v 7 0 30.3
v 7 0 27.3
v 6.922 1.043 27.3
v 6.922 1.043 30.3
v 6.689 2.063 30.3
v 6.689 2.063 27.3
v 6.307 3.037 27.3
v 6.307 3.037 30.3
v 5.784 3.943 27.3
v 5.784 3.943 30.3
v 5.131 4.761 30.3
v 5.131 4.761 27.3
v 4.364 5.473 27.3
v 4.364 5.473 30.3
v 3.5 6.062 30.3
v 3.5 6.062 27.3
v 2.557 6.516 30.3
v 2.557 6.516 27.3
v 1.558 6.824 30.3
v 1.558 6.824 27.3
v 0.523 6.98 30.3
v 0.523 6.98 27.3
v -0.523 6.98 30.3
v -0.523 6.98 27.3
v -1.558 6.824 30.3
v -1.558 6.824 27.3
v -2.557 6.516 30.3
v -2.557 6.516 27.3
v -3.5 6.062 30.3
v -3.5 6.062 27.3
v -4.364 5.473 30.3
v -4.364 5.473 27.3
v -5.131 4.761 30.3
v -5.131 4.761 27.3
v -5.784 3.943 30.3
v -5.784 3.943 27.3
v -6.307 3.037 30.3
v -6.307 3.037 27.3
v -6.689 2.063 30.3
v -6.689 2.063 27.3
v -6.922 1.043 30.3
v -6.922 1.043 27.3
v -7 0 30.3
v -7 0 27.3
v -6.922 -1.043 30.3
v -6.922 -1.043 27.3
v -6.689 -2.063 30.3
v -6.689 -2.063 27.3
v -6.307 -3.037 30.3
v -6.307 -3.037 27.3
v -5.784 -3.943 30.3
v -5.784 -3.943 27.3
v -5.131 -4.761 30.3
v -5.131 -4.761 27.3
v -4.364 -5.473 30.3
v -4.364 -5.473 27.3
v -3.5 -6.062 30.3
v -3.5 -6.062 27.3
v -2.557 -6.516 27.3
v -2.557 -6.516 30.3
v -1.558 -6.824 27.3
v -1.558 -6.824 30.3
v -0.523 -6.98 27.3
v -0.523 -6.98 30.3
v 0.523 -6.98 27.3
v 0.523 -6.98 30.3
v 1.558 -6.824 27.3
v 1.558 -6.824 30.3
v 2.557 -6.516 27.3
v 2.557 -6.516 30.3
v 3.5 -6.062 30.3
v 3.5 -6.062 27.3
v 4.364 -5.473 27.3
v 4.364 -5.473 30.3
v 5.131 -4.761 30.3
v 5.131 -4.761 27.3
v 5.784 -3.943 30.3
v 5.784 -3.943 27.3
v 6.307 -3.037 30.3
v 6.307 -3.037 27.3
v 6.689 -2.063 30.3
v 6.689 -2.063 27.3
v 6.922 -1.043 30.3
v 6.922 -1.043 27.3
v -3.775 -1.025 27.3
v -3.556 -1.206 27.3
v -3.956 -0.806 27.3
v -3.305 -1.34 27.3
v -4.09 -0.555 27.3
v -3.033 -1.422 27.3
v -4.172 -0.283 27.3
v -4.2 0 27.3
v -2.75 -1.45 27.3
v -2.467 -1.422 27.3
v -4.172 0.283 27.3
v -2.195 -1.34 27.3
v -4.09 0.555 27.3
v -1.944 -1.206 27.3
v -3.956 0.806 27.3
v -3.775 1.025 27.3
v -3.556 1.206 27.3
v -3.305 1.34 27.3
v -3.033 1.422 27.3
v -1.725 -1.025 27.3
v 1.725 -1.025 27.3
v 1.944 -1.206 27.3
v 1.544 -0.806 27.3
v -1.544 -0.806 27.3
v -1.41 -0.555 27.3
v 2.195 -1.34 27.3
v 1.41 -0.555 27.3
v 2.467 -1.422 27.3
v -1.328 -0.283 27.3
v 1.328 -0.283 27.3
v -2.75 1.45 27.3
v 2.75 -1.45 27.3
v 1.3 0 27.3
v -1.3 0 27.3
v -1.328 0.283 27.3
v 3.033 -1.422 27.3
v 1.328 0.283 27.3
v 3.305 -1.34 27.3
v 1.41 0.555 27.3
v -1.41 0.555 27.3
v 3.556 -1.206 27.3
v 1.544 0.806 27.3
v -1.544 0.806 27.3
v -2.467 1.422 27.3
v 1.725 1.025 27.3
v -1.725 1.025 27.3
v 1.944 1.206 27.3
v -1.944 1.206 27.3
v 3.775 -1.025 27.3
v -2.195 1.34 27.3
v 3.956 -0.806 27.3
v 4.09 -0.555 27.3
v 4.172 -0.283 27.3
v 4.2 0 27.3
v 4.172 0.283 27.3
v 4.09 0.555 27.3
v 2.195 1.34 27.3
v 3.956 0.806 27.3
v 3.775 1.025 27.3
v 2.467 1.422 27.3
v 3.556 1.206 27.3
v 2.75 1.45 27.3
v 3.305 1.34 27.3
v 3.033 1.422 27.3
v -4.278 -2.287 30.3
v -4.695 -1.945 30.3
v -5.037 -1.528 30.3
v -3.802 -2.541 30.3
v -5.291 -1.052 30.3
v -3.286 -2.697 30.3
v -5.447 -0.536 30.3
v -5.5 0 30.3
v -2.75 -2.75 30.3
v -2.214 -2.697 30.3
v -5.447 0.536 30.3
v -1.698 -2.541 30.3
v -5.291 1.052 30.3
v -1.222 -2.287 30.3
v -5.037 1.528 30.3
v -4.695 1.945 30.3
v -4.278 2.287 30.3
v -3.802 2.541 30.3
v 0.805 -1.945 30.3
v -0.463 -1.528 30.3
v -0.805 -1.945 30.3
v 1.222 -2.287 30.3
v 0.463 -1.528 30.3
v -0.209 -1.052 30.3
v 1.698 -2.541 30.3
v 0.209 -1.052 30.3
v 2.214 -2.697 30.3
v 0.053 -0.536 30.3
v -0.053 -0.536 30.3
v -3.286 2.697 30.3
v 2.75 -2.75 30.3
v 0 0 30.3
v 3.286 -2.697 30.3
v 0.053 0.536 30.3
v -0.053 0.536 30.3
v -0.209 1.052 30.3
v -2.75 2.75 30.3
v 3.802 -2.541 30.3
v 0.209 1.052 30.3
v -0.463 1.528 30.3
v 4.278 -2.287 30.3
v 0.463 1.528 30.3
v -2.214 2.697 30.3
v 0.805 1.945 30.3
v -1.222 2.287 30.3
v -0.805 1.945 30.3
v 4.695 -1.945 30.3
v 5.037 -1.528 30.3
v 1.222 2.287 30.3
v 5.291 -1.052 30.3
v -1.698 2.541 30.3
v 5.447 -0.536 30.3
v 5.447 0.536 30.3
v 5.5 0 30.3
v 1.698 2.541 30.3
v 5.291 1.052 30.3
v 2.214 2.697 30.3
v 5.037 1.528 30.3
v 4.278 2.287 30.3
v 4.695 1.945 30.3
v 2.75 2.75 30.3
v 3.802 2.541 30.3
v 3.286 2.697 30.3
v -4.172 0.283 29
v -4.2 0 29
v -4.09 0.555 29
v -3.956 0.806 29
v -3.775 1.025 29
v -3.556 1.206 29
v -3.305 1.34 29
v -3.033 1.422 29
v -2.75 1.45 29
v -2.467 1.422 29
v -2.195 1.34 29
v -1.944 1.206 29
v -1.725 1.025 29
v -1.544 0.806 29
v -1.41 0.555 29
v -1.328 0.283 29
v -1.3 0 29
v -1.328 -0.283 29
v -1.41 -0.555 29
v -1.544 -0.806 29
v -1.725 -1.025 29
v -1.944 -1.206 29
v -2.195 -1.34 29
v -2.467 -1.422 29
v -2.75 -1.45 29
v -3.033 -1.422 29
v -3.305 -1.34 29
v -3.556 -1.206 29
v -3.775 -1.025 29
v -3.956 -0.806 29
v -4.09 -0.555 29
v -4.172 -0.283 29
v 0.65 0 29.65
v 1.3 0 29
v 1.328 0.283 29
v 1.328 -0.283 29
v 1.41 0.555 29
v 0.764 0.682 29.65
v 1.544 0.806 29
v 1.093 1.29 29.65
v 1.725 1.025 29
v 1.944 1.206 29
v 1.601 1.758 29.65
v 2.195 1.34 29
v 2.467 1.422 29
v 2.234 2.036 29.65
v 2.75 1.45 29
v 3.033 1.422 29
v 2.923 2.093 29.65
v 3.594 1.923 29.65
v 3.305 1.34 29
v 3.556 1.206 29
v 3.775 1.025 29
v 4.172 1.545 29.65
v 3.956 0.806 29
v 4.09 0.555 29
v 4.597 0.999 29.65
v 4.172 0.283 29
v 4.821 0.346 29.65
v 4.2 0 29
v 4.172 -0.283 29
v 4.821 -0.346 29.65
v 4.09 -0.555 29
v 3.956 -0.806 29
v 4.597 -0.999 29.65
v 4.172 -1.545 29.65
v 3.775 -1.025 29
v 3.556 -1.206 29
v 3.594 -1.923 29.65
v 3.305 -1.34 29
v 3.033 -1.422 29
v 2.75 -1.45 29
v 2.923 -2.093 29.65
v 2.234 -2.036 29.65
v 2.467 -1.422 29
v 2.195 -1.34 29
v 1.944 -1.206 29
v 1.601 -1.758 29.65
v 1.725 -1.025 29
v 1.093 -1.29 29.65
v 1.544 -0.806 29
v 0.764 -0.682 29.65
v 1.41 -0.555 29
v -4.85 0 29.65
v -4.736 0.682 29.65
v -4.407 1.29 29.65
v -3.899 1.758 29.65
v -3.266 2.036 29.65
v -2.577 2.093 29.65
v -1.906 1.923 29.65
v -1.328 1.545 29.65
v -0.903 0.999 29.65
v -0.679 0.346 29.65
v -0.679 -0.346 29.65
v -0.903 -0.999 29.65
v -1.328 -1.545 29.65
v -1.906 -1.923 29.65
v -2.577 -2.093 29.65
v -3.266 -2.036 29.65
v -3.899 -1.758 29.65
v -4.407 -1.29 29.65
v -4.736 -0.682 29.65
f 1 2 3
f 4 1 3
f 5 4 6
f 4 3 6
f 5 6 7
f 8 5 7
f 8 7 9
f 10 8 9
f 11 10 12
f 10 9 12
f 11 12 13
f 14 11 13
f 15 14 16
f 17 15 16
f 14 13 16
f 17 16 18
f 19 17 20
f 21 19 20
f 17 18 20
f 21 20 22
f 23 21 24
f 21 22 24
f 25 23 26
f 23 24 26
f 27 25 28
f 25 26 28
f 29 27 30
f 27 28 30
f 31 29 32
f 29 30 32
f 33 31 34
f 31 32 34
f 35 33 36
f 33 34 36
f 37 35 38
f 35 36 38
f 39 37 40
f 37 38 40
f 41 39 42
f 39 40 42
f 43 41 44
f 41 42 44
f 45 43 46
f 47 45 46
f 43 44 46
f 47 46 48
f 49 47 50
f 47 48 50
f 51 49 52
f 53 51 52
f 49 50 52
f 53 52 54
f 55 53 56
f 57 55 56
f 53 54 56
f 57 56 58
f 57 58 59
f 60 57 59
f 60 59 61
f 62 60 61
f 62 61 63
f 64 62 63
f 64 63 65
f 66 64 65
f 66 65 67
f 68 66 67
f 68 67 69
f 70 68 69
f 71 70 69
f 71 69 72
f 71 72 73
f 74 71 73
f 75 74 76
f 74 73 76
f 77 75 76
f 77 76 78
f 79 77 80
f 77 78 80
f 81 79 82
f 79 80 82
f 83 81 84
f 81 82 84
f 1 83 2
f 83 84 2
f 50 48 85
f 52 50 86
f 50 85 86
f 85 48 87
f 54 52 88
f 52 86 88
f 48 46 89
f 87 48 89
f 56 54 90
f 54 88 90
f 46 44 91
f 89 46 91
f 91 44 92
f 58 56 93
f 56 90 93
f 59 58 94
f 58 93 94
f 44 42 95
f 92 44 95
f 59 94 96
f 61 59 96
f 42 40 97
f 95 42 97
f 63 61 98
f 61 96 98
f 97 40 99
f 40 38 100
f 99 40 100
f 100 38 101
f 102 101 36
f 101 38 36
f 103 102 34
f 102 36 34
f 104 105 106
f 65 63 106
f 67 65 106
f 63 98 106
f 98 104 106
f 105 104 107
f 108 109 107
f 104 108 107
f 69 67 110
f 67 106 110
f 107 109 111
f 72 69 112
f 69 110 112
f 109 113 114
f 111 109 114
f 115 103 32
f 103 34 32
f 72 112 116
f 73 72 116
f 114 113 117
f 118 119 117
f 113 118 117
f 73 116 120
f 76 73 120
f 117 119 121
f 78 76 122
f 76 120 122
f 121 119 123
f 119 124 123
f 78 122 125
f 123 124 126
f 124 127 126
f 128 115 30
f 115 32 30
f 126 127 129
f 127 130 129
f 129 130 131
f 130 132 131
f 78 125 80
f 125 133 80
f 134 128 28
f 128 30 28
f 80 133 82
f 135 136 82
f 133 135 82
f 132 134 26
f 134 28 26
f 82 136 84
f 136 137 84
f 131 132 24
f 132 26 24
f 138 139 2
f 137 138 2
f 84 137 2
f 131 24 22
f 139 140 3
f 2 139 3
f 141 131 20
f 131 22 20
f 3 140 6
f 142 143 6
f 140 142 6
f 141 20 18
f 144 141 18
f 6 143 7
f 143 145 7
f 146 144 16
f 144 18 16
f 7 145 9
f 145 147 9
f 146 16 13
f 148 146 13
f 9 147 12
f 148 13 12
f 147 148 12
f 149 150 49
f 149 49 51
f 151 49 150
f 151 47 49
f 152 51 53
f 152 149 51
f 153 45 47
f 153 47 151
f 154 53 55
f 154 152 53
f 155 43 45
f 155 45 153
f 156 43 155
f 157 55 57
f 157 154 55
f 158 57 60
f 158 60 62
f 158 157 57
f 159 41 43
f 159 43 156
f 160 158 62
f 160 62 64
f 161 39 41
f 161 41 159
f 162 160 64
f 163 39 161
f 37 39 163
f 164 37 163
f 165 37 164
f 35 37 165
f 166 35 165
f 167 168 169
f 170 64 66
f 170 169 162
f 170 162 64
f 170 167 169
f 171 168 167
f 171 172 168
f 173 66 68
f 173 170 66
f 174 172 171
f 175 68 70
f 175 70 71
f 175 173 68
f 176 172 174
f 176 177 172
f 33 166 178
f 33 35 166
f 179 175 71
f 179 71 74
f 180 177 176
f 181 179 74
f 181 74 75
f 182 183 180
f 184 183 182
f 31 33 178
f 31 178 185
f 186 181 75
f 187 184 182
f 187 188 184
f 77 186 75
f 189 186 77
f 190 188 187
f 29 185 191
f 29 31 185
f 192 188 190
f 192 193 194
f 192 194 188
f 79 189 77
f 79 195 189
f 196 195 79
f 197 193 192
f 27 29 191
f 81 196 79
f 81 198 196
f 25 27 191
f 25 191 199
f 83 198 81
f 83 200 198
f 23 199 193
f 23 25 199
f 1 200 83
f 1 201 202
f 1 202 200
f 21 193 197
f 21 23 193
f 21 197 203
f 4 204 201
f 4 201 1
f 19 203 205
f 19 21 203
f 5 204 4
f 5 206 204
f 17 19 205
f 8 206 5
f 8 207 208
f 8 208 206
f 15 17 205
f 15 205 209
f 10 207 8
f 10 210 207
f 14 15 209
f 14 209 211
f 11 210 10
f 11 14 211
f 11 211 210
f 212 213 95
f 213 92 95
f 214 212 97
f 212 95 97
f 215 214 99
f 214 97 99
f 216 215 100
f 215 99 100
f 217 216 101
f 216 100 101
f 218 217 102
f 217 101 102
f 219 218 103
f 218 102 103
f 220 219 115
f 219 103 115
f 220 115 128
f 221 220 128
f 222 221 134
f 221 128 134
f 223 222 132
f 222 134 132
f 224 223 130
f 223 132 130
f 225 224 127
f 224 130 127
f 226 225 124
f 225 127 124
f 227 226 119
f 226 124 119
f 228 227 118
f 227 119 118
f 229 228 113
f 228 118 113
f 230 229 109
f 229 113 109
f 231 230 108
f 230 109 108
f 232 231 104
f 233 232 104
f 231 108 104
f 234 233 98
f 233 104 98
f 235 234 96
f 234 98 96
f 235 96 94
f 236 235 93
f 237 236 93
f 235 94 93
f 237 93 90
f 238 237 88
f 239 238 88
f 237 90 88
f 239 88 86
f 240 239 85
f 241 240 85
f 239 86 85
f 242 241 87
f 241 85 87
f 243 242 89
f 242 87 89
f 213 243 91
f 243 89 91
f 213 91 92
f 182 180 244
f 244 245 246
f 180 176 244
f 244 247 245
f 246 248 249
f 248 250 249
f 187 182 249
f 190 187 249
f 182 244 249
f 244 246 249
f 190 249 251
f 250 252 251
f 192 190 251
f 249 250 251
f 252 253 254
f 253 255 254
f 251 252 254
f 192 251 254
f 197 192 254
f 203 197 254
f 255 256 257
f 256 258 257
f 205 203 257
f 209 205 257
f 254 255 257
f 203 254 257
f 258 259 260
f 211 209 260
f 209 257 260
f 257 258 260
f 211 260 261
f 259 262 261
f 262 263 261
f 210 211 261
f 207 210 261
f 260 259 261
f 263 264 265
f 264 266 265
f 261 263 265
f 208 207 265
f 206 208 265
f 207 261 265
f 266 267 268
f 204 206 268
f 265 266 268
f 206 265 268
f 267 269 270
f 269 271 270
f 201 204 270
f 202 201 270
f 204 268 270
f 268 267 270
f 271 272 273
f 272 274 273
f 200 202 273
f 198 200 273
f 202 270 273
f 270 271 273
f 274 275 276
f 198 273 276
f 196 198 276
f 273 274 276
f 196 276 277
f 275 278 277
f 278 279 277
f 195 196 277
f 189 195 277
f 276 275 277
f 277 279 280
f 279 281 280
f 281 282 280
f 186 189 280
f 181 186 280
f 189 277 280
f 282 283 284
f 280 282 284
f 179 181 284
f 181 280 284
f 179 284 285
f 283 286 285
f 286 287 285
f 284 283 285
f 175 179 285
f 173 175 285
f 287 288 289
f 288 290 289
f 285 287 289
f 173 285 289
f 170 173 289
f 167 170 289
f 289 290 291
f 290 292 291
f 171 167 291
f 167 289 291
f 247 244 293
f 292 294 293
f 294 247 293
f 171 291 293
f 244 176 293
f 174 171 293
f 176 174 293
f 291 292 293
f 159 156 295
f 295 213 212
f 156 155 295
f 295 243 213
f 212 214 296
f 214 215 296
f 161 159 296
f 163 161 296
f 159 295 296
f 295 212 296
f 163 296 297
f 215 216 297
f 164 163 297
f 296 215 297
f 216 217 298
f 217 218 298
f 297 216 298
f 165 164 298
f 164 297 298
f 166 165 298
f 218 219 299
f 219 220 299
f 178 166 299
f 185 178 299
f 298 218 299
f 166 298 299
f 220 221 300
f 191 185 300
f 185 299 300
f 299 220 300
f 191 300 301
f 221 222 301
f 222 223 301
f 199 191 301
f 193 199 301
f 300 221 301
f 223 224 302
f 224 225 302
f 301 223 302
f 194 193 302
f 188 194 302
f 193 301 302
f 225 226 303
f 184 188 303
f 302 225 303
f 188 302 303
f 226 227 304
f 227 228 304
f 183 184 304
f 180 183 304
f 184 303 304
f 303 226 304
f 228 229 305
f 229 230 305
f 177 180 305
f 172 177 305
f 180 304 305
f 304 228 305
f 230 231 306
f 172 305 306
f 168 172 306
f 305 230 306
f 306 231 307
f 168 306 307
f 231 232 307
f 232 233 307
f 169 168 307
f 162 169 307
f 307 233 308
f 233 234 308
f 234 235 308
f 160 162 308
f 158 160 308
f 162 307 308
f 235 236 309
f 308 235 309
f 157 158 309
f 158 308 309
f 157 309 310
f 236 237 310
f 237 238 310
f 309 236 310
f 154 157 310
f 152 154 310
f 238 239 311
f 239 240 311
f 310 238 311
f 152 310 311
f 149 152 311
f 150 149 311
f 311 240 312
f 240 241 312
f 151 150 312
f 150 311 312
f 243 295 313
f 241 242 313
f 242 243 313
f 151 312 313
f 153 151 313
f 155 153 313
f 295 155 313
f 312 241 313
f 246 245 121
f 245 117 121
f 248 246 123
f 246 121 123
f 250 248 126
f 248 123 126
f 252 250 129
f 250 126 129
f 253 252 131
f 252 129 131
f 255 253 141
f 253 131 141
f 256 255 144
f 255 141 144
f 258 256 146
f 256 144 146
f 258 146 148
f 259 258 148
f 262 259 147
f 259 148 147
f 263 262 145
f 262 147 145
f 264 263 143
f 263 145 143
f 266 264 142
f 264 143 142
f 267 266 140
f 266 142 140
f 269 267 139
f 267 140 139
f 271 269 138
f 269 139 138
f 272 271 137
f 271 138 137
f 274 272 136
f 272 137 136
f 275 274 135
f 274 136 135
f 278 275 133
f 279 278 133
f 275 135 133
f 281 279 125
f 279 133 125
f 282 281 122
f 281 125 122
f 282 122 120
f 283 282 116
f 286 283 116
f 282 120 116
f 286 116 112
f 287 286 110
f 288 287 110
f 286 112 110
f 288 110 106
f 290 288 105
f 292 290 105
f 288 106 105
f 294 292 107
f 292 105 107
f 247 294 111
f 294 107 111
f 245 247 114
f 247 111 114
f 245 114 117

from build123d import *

# Parameters (mm, degrees)
SKETCH1_R                                            = 7
BOSS_EXTRUDE1_DEPTH                                  = 3
CSK_FOR_M2_5_COUNTERSUNK_FLAT_HEAD_SCREW_D           = 2.9
CSK_FOR_M2_5_COUNTERSUNK_FLAT_HEAD_SCREW_CSINK_D     = 5.5
CSK_FOR_M2_5_COUNTERSUNK_FLAT_HEAD_SCREW_CSINK_ANGLE = 90


with BuildPart() as part:
    # Sketch1 → Boss-Extrude1 (new body)
    with BuildSketch(Plane.XY.offset(27.3)):
        Circle(SKETCH1_R)
    extrude(amount=BOSS_EXTRUDE1_DEPTH)

    # CSK for M2.5 Countersunk Flat Head Screw1 (through all)
    with Locations(Plane.XY.offset(30.3)):
        with Locations((-2.75, 0), (2.75, 0)):
            CounterSinkHole(CSK_FOR_M2_5_COUNTERSUNK_FLAT_HEAD_SCREW_D / 2, CSK_FOR_M2_5_COUNTERSUNK_FLAT_HEAD_SCREW_CSINK_D / 2, counter_sink_angle=CSK_FOR_M2_5_COUNTERSUNK_FLAT_HEAD_SCREW_CSINK_ANGLE)


solid = part.part
